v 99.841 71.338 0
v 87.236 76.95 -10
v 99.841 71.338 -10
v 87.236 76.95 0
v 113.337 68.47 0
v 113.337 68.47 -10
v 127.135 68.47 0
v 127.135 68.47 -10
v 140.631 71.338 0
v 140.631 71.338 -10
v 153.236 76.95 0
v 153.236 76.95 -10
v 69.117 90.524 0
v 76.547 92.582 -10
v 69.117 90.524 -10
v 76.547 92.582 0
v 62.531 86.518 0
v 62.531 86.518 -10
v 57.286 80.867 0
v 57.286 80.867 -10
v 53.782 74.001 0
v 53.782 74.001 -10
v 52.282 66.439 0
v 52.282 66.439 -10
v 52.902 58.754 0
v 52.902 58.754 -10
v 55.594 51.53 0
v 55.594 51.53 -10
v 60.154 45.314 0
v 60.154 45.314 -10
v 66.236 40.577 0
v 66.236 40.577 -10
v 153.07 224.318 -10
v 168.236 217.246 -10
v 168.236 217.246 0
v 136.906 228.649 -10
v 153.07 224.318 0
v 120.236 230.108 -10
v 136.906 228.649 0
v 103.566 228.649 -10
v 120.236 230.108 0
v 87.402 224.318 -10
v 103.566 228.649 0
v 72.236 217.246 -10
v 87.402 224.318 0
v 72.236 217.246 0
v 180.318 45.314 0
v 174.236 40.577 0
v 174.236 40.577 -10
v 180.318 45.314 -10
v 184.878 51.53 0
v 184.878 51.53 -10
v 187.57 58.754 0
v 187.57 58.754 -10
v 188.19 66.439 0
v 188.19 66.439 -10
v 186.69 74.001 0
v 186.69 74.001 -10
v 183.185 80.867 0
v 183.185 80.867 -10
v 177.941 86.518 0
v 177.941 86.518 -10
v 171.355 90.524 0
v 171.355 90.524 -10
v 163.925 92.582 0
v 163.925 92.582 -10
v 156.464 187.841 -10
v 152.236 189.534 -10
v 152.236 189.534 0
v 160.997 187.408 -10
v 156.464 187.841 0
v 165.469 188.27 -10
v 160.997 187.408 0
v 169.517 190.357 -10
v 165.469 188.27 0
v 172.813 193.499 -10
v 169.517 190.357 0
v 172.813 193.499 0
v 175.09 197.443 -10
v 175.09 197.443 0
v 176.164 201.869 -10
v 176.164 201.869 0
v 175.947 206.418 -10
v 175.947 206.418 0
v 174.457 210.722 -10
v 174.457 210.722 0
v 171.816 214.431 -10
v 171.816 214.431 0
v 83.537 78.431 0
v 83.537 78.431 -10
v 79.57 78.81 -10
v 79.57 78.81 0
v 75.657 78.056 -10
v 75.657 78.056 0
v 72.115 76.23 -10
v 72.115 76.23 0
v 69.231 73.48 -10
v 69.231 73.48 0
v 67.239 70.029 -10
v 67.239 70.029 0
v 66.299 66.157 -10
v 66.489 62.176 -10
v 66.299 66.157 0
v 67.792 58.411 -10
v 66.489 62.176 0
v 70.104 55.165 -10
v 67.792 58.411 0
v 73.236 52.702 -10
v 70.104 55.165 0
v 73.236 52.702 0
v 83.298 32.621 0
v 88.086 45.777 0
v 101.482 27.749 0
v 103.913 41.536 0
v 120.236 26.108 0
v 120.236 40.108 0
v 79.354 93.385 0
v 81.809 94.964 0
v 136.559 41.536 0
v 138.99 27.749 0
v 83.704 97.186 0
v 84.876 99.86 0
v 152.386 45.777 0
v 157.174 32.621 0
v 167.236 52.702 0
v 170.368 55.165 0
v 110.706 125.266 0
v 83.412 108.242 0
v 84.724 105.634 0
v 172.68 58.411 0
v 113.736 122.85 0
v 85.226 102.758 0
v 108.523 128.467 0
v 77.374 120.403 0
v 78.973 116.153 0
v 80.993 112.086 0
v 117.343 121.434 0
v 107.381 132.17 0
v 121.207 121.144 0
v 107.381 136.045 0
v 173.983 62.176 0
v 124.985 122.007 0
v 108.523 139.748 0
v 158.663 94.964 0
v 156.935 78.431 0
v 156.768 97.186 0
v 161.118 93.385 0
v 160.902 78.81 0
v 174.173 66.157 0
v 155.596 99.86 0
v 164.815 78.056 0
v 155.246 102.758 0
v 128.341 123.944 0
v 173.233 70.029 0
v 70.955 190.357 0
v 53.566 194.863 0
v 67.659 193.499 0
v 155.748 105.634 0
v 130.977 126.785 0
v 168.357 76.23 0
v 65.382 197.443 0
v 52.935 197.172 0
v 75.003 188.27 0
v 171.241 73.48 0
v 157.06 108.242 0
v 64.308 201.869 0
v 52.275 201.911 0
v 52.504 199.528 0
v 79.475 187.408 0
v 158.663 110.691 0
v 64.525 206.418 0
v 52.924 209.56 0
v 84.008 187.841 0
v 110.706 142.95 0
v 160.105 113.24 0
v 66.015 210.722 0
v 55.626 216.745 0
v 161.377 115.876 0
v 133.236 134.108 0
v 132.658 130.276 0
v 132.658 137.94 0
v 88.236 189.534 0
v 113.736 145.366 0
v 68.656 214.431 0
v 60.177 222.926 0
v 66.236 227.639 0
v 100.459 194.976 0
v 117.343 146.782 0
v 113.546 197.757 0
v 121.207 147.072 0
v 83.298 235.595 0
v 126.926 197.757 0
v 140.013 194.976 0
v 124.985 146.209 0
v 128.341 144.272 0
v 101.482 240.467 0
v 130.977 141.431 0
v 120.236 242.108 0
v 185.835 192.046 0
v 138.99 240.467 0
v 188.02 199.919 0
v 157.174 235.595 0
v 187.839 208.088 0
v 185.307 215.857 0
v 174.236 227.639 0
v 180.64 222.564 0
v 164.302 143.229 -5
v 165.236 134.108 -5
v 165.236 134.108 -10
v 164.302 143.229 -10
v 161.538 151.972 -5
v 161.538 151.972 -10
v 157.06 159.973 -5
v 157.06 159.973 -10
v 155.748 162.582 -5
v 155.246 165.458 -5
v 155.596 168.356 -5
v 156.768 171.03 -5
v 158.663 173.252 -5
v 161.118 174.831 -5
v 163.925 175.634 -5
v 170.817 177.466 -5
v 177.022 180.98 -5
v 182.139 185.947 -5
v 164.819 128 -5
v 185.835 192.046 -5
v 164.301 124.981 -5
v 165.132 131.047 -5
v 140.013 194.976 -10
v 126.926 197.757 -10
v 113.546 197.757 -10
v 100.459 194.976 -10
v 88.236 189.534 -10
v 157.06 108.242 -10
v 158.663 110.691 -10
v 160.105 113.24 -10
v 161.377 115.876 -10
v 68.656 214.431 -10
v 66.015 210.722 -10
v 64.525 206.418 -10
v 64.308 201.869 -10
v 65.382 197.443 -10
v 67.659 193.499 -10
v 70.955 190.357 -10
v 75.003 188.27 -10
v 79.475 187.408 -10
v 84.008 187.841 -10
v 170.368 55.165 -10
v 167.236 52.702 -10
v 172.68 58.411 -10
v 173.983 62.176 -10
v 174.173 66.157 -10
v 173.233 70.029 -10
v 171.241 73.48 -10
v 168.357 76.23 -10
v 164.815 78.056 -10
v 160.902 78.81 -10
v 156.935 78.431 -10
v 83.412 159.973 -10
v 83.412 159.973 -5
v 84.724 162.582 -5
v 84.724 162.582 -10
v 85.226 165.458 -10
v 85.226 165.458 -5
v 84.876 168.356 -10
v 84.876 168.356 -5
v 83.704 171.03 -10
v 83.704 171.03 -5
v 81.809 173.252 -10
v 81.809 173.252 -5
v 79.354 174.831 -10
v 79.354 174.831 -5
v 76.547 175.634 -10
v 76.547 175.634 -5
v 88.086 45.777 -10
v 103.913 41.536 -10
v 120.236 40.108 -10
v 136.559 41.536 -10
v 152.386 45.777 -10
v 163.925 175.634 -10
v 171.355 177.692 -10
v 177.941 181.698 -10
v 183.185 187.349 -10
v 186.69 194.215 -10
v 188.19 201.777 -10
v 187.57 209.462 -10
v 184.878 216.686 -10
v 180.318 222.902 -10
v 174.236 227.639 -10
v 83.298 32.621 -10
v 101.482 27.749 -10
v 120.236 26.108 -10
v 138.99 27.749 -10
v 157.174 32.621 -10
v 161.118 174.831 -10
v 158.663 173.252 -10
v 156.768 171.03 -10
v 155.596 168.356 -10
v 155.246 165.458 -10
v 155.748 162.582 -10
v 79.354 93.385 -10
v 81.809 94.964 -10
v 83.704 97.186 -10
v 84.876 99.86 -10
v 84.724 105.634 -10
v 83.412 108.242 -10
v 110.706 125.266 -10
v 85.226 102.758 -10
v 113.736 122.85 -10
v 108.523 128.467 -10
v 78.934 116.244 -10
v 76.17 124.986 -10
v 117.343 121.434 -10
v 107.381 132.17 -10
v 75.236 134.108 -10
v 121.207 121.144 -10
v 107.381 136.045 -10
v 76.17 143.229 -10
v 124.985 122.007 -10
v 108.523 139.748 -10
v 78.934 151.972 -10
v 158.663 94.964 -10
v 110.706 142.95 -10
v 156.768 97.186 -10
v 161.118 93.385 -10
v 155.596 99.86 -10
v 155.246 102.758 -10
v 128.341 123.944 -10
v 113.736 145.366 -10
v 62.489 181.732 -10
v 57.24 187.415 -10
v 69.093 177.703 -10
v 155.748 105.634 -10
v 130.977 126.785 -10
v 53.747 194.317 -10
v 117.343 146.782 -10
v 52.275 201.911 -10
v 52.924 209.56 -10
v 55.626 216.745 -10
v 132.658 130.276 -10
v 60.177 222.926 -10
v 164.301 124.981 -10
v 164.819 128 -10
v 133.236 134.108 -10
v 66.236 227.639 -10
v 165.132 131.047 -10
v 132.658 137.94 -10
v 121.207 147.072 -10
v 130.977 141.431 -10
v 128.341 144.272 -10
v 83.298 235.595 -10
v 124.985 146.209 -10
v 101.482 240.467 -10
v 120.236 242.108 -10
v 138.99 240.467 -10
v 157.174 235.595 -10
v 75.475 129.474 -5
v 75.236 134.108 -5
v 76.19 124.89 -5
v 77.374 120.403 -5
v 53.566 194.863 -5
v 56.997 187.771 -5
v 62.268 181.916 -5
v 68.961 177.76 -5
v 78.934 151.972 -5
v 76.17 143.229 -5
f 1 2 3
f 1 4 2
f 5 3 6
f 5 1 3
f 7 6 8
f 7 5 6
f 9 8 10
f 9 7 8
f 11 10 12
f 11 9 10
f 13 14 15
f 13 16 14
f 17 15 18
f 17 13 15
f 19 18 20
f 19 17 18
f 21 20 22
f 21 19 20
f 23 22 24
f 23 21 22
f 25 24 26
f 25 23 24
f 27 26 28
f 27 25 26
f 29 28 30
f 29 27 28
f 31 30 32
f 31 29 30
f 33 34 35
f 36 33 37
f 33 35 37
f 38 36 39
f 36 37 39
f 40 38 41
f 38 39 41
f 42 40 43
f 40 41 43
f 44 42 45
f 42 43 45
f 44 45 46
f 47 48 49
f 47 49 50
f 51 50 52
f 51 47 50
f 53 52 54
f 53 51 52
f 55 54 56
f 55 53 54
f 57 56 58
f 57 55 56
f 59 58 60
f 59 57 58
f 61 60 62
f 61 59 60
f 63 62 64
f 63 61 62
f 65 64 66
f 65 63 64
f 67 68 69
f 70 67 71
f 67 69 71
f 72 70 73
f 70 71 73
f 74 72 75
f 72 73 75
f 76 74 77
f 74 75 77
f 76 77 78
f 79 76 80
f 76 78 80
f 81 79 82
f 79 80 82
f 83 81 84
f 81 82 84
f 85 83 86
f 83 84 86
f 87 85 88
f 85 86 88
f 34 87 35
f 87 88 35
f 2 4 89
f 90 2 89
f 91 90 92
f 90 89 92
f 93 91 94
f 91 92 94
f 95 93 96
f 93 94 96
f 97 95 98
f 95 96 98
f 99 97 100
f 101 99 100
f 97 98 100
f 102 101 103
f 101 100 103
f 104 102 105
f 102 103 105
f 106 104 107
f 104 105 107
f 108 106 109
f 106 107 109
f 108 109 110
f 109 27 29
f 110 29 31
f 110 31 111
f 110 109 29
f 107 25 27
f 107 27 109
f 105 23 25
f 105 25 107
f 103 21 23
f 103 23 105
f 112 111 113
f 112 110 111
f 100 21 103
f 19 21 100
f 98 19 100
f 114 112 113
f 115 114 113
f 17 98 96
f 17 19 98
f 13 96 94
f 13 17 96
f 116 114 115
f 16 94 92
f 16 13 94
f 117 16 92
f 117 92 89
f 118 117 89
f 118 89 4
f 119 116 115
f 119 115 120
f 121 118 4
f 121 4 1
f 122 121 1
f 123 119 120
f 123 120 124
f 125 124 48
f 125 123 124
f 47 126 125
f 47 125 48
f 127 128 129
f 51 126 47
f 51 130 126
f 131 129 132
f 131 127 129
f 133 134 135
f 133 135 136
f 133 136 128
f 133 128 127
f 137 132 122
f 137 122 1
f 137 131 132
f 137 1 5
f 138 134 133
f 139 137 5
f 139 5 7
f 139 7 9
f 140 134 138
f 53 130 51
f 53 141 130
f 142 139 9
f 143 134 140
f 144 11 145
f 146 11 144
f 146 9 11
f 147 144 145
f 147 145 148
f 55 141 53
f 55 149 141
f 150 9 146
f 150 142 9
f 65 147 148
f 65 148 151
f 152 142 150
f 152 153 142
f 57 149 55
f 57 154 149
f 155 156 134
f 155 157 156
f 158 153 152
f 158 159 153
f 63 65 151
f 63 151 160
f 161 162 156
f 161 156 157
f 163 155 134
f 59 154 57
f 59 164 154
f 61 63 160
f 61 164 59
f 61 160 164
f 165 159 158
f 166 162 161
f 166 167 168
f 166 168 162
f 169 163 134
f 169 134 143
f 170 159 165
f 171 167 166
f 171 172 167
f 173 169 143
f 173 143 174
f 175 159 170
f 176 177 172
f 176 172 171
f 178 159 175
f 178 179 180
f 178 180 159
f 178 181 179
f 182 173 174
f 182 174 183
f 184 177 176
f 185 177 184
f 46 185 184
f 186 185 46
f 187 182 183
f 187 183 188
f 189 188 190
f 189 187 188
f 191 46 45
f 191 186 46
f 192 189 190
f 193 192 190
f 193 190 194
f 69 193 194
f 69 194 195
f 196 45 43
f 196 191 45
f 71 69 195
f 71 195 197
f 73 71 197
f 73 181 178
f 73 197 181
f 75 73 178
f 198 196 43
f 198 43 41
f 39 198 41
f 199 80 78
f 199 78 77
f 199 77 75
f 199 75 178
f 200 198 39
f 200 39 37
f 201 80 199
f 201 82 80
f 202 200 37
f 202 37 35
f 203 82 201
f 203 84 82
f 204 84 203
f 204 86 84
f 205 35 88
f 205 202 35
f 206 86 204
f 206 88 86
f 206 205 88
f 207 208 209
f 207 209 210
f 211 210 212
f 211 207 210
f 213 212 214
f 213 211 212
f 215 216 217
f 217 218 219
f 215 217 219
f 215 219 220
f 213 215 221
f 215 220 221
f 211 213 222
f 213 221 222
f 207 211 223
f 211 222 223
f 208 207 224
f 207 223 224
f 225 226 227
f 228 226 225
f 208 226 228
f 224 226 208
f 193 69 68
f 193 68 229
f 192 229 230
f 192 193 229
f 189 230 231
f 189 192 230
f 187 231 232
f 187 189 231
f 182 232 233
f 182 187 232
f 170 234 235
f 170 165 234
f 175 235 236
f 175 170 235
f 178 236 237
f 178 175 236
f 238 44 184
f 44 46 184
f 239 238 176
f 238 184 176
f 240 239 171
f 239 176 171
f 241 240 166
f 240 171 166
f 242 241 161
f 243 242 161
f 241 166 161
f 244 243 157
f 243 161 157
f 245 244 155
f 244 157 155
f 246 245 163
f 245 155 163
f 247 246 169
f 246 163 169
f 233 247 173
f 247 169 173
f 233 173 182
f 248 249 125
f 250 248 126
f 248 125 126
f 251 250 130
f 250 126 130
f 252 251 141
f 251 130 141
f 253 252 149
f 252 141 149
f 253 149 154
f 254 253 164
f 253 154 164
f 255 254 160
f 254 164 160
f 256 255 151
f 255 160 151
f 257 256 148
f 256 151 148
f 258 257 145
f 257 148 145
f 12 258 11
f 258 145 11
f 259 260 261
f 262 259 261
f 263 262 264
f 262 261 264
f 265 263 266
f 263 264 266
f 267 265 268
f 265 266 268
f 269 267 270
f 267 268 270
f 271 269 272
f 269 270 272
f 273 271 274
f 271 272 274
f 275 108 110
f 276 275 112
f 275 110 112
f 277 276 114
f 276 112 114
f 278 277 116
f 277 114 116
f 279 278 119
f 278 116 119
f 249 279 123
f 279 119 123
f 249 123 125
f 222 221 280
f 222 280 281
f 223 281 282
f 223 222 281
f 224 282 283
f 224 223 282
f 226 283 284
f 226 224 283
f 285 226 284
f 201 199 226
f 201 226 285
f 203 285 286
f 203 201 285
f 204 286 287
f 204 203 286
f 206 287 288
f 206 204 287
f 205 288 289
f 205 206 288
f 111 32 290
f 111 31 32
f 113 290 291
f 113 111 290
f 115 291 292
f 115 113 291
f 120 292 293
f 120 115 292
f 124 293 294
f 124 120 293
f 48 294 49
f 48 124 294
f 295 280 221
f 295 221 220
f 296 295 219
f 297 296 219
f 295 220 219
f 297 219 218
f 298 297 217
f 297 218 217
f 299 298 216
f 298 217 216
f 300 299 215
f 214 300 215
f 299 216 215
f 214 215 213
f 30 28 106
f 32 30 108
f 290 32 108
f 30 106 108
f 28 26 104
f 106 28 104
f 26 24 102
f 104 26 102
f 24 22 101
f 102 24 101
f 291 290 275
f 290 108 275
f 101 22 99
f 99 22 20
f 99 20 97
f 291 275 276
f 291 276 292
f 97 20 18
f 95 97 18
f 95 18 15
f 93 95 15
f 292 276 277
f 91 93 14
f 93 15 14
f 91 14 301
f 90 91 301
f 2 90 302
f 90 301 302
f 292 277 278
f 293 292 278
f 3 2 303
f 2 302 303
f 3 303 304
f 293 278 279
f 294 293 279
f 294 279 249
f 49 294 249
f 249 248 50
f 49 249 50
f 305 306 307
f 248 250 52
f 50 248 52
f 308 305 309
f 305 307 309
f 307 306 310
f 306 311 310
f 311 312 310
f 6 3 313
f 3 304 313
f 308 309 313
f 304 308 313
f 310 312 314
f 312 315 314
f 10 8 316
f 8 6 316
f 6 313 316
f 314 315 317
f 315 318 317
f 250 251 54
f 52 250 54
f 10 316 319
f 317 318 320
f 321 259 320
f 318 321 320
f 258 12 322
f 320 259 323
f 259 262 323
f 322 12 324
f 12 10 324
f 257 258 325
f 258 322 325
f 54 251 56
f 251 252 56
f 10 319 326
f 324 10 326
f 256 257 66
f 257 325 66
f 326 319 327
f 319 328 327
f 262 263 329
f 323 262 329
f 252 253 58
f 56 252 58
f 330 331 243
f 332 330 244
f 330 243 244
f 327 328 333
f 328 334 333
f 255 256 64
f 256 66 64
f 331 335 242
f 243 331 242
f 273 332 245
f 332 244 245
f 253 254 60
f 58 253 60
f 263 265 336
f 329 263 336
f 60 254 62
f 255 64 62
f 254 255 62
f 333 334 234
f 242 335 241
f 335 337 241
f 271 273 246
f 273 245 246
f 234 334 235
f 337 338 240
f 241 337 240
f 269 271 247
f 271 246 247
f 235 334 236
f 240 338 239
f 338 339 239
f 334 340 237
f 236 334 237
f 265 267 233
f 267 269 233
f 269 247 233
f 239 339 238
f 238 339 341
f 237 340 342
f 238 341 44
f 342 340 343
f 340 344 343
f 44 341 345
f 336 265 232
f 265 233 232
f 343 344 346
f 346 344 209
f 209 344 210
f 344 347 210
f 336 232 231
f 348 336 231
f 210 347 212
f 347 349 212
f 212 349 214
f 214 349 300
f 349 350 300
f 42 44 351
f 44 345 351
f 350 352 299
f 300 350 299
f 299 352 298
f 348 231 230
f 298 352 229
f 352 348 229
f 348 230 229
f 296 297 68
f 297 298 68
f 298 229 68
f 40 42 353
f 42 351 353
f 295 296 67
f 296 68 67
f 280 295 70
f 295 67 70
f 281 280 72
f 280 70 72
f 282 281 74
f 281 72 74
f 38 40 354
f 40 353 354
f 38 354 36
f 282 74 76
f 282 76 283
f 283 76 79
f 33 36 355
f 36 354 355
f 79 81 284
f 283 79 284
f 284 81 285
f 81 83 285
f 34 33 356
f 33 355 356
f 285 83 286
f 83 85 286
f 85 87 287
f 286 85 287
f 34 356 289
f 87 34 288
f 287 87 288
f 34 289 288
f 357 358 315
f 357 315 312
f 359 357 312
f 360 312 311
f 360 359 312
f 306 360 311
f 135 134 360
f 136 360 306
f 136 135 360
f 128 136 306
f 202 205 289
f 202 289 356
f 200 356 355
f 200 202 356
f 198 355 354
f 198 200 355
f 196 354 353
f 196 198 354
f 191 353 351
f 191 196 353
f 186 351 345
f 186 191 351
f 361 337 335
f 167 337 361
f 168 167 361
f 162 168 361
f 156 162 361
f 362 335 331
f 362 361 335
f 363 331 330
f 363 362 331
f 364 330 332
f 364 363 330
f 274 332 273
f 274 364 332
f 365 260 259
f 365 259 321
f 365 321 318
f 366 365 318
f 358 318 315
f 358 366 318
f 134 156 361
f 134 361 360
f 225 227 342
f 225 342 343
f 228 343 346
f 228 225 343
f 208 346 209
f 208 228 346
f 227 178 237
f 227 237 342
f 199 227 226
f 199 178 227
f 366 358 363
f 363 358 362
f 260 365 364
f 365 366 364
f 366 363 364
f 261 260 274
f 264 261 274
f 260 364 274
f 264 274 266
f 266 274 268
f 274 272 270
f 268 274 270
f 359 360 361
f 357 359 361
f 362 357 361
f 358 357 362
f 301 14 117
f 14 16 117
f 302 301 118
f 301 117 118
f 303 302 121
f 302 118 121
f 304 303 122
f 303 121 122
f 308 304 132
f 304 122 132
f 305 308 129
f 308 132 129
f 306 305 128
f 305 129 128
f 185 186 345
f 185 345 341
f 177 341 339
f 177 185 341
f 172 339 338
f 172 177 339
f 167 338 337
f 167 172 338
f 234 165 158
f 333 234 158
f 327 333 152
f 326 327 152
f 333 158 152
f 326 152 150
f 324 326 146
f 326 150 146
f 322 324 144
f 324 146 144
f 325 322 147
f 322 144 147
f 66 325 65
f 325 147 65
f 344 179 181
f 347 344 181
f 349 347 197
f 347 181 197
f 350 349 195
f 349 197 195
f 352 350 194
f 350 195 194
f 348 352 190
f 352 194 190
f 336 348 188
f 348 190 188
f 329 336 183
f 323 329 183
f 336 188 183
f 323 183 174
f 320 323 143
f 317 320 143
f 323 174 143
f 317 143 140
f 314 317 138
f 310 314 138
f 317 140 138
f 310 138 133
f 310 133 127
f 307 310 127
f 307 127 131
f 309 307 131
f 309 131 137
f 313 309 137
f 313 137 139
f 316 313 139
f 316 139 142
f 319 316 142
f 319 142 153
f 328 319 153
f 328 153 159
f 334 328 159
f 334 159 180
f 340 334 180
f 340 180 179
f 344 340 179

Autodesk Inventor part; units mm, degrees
ref_plane "YZ Plane" through (0, 0, 0) normal (1, 0, 0) x (0, 1, 0)
ref_plane "XZ Plane" through (0, 0, 0) normal (0, 1, 0) x (-1, 0, 0)
ref_plane "XY Plane" through (0, 0, 0) normal (0, 0, 1) x (1, 0, 0)
sketch "Эскиз1" plane through (0, 0, 0) normal (0, 0, 1) x (1, 0, 0)
  circle A0 centre (120.236, 134.1079) radius 13
  arc A1 (165.236, 134.1079) -> (157.0596, 159.9734) centre (120.236, 134.1079) ccw
  arc A2 (168.236, 217.2464) -> (72.236, 217.2464) centre (120.236, 134.1079) ccw
  arc A3 (152.236, 189.5336) -> (88.236, 189.5336) centre (120.236, 134.1079) ccw
  arc A4 (152.236, 189.5336) -> (168.236, 217.2464) centre (160.236, 203.39) ccw
  arc A5 (72.236, 217.2464) -> (88.236, 189.5336) centre (80.236, 203.39) ccw
  arc A6 (174.236, 227.6387) -> (66.236, 227.6387) centre (120.236, 134.1079) ccw
  arc A7 (66.236, 227.6387) -> (52.275, 201.9114) centre (80.236, 203.39) ccw
  line L0 (68.236, 134.1079) -> (172.236, 134.1079)
  arc A8 (75.236, 134.1079) -> (83.4123, 108.2425) centre (120.236, 134.1079) ccw
  arc A9 (52.275, 201.9114) -> (76.5468, 175.6341) centre (80.236, 203.39) ccw
  line L1 (120.236, 242.1079) -> (120.236, 26.1079)
  arc A10 (73.236, 52.7015) -> (167.236, 52.7015) centre (120.236, 134.1079) ccw
  arc A11 (87.236, 76.9503) -> (153.236, 76.9503) centre (120.236, 134.1079) ccw
  arc A12 (87.236, 76.9503) -> (73.236, 52.7015) centre (80.236, 64.8259) ccw
  arc A13 (167.236, 52.7015) -> (153.236, 76.9503) centre (160.236, 64.8259) ccw
  arc A14 (66.236, 40.5772) -> (174.236, 40.5772) centre (120.236, 134.1079) ccw
  arc A15 (174.236, 40.5772) -> (163.9251, 92.5818) centre (160.236, 64.8259) ccw
  arc A16 (76.5468, 92.5818) -> (83.4123, 108.2425) centre (75.2293, 102.4946) ccw
  arc A17 (157.0596, 108.2425) -> (163.9251, 92.5818) centre (165.2426, 102.4946) ccw
  arc A18 (157.0596, 108.2425) -> (165.236, 134.1079) centre (120.236, 134.1079) ccw
  arc A19 (76.5468, 92.5818) -> (66.236, 40.5772) centre (80.236, 64.8259) ccw
  arc A20 (83.4123, 159.9734) -> (76.5468, 175.6341) centre (75.2293, 165.7212) ccw
  arc A21 (83.4123, 159.9734) -> (75.236, 134.1079) centre (120.236, 134.1079) ccw
  arc A22 (163.9251, 175.6341) -> (157.0596, 159.9734) centre (165.2426, 165.7212) ccw
  arc A23 (163.9251, 175.6341) -> (174.236, 227.6387) centre (160.236, 203.39) ccw
  line L2 (161.3771, 115.876) -> (185.8349, 192.0456)
  arc A24 (58.8114, 82.8534) -> (181.6605, 82.8534) centre (120.236, 134.1079) ccw
  arc A25 (181.6605, 185.3625) -> (58.8114, 185.3625) centre (120.236, 134.1079) ccw
  line L3 (120.236, 134.1079) -> (66.236, 40.5772)
  line L4 (120.236, 134.1079) -> (174.236, 40.5772)
  line L5 (120.236, 134.1079) -> (66.236, 227.6387)
  line L6 (120.236, 134.1079) -> (174.236, 227.6387)
  line L7 (53.5661, 194.8626) -> (77.3736, 120.4032)
  point P0 (164.3006, 124.9806)
  point P1 (165.236, 134.1079)
  point P2 (167.2313, 134.1079)
  dimension "d122" = 10
  dimension "d123" = 28
  dimension "d124" = 16
  dimension "d125" = 14
  dimension "d126" = 108
  dimension "d127" = 45
  dimension "d128" = 26
  dimension "d130" = 12.198
  dimension "d131" = 47.802
  dimension "d133" = 0
  dimension "d134" = 4.765
  dimension "d135" = 1.8998
  dimension "d139" = 94.2555
  dimension "d153" = 44.7453
  dimension "d154" = 55.683
  dimension "d155" = 0
  dimension "d156" = 55.683
  dimension "d157" = 0
  dimension "d158" = 81.3984
  dimension "d159" = 1.8998
  dimension "d160" = 77.9423
  dimension "d161" = 0
  dimension "d162" = 85.4495
  dimension "d163" = 89.4905
  dimension "d164" = 0
  dimension "d165" = 89.4905
extrude "Выдавливание3" add sketch "Эскиз1" against normal blind 5 contours L0 A18 L2 A17 A15 A24 A13 L4 A0 | A0 L6 A4 A25 A23 A22 A1 L0 | A0 L1 A3 L6 | L4 A11 L1 A0 | A1 A22 A23 L2 L0 | L0 L2 A18 | A0 L5 A3 L1 | L1 A11 L3 A0 | L0 A21 A20 A9 A25 A5 L5 A0 | A0 L3 A12 A24 A19 A16 A8 L0 | A4 L6 A23 A25 | A24 A15 L4 A13 | A8 L7 L0 | L0 L7 A9 A20 A21 | A2 L1 A6 L6 | L4 A14 L1 A10 | A12 L3 A19 A24 | A25 A9 A7 L5 A5 | A2 L5 A6 L1 | L1 A14 L3 A10
extrude "Выдавливание4" add sketch "Эскиз1" against normal blind 10 contours L0 A18 L2 A17 A15 A24 A13 L4 A0 | A0 L6 A4 A25 A23 A22 A1 L0 | A0 L1 A3 L6 | L4 A11 L1 A0 | A0 L5 A3 L1 | L1 A11 L3 A0 | L0 A21 A20 A9 A25 A5 L5 A0 | A0 L3 A12 A24 A19 A16 A8 L0 | A4 L6 A23 A25 | A24 A15 L4 A13 | A2 L1 A6 L6 | L4 A14 L1 A10 | A12 L3 A19 A24 | A25 A9 A7 L5 A5 | A2 L5 A6 L1 | L1 A14 L3 A10
properties part number "3.2"
